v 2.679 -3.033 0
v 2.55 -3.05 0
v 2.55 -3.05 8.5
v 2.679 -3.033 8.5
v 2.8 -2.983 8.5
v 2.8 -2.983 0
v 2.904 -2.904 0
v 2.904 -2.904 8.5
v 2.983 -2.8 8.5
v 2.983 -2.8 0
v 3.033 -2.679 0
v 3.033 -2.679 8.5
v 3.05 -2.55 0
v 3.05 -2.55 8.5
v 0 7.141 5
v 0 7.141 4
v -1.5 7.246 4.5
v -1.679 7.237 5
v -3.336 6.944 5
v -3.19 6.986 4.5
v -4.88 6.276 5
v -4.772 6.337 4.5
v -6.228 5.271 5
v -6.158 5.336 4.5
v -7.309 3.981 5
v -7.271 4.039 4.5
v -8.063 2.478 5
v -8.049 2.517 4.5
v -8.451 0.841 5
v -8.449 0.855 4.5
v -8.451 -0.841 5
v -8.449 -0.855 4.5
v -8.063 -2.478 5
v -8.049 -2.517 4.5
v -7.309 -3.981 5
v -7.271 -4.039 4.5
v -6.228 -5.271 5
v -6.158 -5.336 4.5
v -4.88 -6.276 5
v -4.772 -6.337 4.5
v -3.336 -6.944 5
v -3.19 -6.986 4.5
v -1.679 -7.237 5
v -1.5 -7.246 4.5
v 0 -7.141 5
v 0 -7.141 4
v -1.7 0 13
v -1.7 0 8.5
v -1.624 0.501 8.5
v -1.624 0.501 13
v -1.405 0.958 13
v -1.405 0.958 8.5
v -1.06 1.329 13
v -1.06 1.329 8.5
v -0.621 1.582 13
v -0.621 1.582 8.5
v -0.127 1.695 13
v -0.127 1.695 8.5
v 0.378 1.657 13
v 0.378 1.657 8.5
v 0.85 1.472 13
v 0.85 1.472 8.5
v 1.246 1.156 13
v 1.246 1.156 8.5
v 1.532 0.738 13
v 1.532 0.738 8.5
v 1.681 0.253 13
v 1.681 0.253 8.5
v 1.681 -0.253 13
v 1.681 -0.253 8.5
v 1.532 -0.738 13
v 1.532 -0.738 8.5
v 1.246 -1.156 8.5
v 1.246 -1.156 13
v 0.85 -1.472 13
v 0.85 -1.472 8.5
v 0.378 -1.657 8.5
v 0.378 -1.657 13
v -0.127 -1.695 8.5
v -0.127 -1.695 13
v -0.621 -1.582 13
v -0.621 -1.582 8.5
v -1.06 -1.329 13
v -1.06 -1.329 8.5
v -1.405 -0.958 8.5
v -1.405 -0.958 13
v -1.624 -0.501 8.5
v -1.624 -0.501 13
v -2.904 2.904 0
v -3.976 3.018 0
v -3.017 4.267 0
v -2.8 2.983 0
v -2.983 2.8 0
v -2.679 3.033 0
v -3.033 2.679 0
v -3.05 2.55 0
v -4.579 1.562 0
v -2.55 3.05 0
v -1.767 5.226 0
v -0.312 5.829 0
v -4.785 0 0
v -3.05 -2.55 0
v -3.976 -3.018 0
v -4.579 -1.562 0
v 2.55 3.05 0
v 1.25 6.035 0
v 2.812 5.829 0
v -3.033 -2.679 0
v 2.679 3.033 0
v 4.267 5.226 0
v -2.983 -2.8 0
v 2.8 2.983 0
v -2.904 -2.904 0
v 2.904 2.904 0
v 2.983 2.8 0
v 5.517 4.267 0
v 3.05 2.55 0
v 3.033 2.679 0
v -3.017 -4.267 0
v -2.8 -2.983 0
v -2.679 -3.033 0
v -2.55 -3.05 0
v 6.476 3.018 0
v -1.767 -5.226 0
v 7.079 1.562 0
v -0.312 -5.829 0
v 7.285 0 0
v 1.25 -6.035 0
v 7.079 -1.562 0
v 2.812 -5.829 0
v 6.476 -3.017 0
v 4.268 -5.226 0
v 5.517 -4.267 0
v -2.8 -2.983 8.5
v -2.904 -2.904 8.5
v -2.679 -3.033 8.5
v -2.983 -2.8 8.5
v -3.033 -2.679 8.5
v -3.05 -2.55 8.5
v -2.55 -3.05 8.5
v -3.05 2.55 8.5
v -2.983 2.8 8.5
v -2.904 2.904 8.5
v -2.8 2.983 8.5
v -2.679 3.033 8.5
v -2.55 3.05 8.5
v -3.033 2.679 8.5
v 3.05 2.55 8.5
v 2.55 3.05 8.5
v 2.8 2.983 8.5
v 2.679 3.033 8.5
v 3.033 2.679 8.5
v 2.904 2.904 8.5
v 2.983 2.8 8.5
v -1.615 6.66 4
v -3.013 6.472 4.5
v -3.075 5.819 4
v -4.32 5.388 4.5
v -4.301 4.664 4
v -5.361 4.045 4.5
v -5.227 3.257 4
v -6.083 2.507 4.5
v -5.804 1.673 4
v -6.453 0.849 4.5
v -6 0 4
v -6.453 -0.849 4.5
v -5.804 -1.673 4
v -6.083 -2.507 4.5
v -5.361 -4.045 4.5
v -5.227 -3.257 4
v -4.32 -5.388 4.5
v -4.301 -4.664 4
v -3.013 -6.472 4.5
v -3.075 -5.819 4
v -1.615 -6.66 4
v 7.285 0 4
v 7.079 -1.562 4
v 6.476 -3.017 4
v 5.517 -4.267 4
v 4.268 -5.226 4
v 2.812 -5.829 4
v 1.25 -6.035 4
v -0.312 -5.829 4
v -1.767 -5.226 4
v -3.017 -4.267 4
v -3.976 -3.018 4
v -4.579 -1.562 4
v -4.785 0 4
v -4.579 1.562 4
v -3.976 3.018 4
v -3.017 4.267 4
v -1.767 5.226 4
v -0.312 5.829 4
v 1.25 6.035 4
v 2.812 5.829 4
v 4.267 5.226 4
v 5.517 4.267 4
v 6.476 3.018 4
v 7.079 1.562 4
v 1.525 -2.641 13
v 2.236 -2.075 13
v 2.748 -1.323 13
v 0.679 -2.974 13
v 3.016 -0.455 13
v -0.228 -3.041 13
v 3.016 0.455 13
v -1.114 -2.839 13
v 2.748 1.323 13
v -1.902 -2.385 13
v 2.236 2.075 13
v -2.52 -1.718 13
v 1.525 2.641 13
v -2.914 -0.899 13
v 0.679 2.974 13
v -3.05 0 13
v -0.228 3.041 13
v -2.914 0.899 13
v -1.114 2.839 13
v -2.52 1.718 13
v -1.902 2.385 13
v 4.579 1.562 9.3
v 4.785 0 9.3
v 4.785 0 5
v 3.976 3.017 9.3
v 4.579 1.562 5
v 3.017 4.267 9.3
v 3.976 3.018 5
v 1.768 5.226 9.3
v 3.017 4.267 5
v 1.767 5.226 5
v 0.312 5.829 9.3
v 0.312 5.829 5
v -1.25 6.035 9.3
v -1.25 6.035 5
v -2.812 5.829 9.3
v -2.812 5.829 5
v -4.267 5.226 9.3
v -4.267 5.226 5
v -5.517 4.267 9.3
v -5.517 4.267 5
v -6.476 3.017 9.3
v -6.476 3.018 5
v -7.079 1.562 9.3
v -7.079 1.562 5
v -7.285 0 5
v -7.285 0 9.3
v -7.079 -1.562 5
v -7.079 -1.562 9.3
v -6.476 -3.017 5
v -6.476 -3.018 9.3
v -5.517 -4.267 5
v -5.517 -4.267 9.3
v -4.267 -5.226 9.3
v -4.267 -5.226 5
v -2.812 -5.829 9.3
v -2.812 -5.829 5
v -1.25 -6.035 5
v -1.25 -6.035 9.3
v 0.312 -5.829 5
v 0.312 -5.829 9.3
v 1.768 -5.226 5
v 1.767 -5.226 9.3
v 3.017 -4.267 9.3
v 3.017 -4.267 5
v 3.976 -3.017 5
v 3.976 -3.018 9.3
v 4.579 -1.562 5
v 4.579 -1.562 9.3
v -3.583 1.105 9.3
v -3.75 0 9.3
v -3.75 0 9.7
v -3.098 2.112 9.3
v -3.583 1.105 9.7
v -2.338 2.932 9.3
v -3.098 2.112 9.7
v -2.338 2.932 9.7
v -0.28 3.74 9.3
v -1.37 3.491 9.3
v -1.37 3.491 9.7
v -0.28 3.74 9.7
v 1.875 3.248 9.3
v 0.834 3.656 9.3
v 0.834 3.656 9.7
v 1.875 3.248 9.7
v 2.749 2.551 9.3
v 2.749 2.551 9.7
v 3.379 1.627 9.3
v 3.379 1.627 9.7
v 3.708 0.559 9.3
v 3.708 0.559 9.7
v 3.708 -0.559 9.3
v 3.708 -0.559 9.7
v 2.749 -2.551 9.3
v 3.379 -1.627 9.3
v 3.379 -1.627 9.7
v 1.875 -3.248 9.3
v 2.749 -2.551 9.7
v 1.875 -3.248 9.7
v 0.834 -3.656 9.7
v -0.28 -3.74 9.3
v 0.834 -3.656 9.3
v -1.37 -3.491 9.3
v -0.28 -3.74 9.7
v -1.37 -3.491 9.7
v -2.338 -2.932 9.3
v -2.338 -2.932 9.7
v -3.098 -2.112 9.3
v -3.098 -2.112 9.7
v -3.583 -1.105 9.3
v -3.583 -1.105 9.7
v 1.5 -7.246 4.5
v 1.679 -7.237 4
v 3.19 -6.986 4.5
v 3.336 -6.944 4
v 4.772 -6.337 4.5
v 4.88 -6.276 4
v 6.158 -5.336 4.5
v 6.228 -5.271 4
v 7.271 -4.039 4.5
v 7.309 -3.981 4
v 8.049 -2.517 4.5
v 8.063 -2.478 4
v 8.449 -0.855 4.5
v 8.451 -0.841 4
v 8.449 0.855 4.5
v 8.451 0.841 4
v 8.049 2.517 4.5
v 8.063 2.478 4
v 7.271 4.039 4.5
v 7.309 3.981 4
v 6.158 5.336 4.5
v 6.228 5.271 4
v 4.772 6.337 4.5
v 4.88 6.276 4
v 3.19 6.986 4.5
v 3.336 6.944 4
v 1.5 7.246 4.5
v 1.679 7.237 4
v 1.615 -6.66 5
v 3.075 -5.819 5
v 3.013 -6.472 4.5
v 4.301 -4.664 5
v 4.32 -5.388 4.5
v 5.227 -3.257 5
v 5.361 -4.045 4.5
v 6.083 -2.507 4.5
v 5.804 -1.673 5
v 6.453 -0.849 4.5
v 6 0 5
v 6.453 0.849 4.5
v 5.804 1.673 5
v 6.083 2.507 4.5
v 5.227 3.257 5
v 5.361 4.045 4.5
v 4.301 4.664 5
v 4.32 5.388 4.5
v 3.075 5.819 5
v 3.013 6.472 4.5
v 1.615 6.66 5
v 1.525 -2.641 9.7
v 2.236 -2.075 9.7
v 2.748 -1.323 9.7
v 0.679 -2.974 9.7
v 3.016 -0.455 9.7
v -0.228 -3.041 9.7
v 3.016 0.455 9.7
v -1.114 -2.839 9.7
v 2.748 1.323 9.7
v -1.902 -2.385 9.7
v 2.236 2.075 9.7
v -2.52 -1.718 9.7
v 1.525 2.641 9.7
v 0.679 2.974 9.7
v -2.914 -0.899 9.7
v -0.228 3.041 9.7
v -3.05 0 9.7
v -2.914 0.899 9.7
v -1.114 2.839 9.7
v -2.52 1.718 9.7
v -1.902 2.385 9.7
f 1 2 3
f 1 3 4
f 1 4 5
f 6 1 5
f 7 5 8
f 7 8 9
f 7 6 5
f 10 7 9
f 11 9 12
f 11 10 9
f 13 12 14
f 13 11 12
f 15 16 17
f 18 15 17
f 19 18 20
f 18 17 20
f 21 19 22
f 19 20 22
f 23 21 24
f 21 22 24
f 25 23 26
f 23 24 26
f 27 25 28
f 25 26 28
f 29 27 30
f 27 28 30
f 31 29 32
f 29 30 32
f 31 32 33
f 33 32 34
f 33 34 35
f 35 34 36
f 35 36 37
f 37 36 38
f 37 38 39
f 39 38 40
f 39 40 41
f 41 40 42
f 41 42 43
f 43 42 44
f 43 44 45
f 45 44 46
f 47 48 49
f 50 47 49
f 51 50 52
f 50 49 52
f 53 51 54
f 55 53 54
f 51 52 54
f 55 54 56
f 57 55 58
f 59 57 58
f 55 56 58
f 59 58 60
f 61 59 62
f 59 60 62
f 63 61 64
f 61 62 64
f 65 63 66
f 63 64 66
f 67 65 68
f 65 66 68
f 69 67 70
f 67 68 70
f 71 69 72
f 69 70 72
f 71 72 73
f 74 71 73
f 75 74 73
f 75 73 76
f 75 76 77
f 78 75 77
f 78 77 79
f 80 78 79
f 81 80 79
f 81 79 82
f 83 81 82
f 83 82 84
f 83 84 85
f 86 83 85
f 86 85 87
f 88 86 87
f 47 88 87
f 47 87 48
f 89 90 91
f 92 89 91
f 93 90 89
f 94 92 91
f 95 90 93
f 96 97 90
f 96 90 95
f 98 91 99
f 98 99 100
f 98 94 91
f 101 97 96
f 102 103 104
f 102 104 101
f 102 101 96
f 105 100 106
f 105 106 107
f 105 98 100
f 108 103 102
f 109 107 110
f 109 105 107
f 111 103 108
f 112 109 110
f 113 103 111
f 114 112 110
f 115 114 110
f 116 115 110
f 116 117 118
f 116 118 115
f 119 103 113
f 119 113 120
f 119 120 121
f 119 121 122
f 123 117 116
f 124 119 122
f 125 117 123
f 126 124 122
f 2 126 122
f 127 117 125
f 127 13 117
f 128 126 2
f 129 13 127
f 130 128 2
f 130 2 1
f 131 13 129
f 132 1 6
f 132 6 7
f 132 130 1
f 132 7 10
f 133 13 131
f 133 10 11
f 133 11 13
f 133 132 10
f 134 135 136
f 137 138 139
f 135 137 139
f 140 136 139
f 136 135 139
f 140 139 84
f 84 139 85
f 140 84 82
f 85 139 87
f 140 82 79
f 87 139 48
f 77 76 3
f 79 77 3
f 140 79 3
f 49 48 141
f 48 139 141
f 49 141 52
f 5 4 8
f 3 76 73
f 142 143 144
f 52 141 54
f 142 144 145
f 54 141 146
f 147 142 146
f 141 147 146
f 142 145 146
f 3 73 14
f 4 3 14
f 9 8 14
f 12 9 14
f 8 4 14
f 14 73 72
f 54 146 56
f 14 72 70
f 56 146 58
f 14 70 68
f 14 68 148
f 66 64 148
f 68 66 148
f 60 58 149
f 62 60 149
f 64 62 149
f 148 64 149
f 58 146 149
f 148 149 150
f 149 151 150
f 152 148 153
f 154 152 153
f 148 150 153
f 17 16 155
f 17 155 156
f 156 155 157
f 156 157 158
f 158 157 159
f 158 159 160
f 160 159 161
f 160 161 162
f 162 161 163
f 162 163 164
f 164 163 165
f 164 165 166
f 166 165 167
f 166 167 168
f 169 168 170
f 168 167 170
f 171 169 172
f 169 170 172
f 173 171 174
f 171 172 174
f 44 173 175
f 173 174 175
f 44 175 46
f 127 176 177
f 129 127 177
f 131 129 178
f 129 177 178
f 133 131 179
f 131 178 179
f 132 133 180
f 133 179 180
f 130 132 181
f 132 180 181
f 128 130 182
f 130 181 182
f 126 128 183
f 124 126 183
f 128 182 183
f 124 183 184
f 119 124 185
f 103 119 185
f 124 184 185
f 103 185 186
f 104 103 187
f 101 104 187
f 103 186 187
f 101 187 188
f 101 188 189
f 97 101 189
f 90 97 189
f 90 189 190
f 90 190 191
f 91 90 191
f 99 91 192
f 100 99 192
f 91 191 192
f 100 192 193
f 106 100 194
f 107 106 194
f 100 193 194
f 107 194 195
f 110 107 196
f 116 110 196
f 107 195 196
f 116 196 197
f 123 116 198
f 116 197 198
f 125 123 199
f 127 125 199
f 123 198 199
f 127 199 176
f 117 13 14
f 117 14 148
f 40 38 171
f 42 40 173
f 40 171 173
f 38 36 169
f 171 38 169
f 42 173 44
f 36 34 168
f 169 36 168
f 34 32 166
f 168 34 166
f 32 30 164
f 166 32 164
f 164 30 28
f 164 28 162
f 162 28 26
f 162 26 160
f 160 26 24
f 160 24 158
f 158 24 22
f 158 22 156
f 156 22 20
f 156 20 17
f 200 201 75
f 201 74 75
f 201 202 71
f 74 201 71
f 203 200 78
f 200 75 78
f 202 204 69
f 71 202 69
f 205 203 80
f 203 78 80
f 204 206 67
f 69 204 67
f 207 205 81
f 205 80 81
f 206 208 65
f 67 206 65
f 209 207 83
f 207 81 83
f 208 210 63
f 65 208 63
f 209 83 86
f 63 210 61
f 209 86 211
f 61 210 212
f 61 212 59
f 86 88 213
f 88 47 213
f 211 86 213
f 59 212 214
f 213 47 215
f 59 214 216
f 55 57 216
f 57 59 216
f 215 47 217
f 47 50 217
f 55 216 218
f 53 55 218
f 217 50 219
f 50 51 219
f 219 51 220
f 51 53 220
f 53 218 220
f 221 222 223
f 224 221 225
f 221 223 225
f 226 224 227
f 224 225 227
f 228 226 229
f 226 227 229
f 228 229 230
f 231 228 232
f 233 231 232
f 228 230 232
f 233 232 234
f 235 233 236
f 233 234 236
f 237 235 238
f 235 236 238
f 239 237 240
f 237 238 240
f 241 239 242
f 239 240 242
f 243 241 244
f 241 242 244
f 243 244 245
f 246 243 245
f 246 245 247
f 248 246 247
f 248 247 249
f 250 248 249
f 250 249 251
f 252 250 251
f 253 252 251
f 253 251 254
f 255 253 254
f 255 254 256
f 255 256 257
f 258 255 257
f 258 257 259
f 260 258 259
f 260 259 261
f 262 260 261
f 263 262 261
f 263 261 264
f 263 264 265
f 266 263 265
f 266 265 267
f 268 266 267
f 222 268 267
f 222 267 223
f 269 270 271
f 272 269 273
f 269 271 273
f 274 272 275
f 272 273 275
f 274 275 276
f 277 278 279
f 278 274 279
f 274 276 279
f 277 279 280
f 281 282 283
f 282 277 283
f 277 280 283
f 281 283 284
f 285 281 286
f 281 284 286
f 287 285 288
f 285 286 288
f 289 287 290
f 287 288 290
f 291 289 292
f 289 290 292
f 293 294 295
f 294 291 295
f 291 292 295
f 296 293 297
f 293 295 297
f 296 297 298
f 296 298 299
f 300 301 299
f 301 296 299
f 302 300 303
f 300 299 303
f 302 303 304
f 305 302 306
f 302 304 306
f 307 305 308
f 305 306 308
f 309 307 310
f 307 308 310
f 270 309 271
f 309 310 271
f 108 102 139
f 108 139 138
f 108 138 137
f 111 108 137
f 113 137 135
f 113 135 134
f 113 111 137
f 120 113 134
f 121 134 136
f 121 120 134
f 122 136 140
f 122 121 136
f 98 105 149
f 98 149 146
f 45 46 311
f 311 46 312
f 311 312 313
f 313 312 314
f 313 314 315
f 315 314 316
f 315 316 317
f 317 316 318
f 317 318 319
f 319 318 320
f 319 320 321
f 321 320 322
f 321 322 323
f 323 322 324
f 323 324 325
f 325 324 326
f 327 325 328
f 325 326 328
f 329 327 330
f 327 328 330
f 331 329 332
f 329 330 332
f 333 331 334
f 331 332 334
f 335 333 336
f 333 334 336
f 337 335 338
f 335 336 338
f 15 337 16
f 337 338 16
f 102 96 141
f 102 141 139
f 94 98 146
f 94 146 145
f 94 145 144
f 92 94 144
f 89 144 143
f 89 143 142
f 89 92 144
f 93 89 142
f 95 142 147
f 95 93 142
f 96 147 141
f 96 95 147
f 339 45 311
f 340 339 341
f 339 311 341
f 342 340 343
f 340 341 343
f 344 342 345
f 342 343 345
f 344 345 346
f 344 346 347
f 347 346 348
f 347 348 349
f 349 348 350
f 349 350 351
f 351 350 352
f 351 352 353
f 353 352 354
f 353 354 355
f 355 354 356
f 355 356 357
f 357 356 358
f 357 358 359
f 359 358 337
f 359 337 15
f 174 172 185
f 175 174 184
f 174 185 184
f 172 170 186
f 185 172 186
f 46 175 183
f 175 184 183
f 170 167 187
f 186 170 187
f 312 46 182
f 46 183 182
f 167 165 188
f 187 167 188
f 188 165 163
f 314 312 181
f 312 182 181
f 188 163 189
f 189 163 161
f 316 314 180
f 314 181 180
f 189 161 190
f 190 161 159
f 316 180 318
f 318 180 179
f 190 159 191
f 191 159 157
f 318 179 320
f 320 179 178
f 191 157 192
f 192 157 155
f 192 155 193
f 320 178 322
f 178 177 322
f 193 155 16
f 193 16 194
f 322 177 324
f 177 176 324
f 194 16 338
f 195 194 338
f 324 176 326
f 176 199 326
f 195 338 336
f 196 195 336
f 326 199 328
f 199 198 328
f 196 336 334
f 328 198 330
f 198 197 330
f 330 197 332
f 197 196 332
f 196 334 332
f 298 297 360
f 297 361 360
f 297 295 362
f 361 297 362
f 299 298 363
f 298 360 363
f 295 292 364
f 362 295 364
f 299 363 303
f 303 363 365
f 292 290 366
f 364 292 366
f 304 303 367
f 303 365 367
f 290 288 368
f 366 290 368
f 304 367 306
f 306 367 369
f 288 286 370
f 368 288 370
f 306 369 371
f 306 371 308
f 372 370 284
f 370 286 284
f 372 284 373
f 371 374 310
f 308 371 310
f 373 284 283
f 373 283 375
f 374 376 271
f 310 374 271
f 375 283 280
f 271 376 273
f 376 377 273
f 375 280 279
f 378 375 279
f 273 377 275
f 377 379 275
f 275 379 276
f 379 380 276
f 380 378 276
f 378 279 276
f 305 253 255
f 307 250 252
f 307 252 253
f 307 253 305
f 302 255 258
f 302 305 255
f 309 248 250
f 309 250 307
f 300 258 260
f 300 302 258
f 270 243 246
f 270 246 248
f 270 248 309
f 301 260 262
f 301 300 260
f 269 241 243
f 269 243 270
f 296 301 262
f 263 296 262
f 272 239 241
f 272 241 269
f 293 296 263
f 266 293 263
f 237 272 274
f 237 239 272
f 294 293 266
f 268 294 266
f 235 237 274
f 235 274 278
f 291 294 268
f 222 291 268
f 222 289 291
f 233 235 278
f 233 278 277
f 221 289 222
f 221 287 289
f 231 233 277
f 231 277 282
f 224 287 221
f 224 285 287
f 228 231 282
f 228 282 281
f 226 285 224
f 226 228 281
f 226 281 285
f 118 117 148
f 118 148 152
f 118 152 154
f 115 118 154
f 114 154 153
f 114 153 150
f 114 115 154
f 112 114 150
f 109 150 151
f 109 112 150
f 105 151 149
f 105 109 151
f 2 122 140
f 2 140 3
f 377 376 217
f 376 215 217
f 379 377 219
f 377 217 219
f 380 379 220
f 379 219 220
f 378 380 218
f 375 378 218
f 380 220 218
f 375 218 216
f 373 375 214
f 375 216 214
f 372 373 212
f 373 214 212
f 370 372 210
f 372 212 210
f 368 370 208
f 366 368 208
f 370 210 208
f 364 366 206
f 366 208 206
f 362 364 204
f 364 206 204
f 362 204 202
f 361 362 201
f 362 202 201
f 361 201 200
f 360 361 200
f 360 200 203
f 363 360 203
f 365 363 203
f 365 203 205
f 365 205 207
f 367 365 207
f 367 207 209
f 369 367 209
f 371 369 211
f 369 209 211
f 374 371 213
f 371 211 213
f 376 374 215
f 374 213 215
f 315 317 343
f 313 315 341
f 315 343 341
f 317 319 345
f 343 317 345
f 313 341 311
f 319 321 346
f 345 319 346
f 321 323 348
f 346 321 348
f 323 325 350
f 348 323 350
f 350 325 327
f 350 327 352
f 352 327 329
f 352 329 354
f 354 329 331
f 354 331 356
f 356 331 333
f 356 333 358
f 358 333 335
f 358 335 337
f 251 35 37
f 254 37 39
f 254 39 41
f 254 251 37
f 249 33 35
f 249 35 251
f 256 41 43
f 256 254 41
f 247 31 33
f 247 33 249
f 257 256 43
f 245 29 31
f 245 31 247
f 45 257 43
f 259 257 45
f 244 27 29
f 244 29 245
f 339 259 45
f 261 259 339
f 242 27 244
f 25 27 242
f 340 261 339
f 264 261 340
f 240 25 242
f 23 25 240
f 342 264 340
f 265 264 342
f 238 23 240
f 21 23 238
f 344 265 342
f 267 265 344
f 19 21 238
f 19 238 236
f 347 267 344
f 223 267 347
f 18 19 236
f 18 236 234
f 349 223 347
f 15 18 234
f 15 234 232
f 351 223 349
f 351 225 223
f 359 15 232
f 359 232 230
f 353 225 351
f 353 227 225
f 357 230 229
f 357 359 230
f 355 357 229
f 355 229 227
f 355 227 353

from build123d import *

# Parameters (mm, degrees)
EXTRUDE_START           = -0.5
EXTRUDE_1_OUTLINE_R     = 6.035
EXTRUDE_1_DEPTH         = 4.8
EXTRUDE_START_2         = 4
EXTRUDE_1_2_DEPTH       = 1
SKETCH_2_R              = 6.035
EXTRUDE_2_DEPTH         = 4
HOLE_WIZARD_3_4_3_4_1_D = 3.4
CUT_EXTRUDE_1_DEPTH     = 8.5


with BuildPart() as part:
    # 凸台-拉伸1: read off the stored shape, not the designer's step
    # 凸台-拉伸1 outline → 凸台-拉伸1 (new body)
    with BuildSketch(Plane.XY.offset(5).offset(EXTRUDE_START)):
        with Locations((-1.25, 0)):
            Circle(EXTRUDE_1_OUTLINE_R)
    extrude(amount=EXTRUDE_1_DEPTH)

    # Extrude 1 2 outline → Extrude 1 2 (add)
    with BuildSketch(Plane.XY.offset(EXTRUDE_START_2)):
        with BuildLine():
            ThreePointArc((0, -7.141428429), (8.5, 0), (0, 7.141428429))
            ThreePointArc((0, 7.141428429), (-8.5, 0), (0, -7.141428429))
        make_face()
    extrude(amount=EXTRUDE_1_2_DEPTH)

    # Extrude 1 3 outline → Extrude 1 3 (revolve, cut)
    with BuildSketch(Plane(origin=(-1.25, 0, 0), x_dir=(1, 0, 0), z_dir=(0, -1, 0))):
        Polygon((7.25, 5), (7.75, 4.5), (9.75, 4.5), (9.75, 5), align=None)
    revolve(axis=Axis((-1.25, 0, 0), (0, 0, 1)), mode=Mode.SUBTRACT)

    # Extrude 1 4 outline → Extrude 1 4 (revolve, cut)
    with BuildSketch(Plane(origin=(1.25, 0, 0), x_dir=(1, 0, 0), z_dir=(0, -1, 0))):
        Polygon((9.75, 4.5), (7.75, 4.5), (7.25, 4), (9.75, 4), align=None)
    revolve(axis=Axis((1.25, 0, 0), (0, 0, 1)), mode=Mode.SUBTRACT)

    # 草图2 → 凸台-拉伸2 (add)
    with BuildSketch(Plane(origin=(0, 0, 4), x_dir=(-1, 0, 0), z_dir=(0, 0, -1))):
        with Locations(Location((-1.25, 0, 0), (0, 0, 180))):
            Circle(SKETCH_2_R)
    extrude(amount=EXTRUDE_2_DEPTH)

    # 草图5 → 旋转1 (revolve)
    with BuildSketch(Plane.XZ, mode=Mode.PRIVATE) as revolve_1_sk:
        Polygon((3.05, 13), (0, 13), (0, 9), (3.75, 9), (3.75, 9.7), (3.05, 9.7), align=None)
    revolve(revolve_1_sk.sketch.rotate(Axis((0, 0, 13), (0, 0, -1)), 180), axis=Axis((0, 0, 13), (0, 0, -1)))

    # Ø3.4 (3.4) 直径孔1 (through all)
    with Locations(Plane.XY.offset(13)):
        with Locations((0, 0)):
            Hole(HOLE_WIZARD_3_4_3_4_1_D / 2)

    # 草图8 → 切除-拉伸1 (cut)
    with BuildSketch(Plane(origin=(0, 0, 0), x_dir=(-1, 0, 0), z_dir=(0, 0, -1))):
        with BuildLine():
            Line((-2.55, 3.05), (2.55, 3.05))
            ThreePointArc((2.55, 3.05), (2.903553391, 2.903553391), (3.05, 2.55))
            Line((3.05, 2.55), (3.05, -2.55))
            ThreePointArc((3.05, -2.55), (2.903553391, -2.903553391), (2.55, -3.05))
            Line((2.55, -3.05), (-2.55, -3.05))
            ThreePointArc((-2.55, -3.05), (-2.903553391, -2.903553391), (-3.05, -2.55))
            Line((-3.05, -2.55), (-3.05, 2.55))
            ThreePointArc((-3.05, 2.55), (-2.903553391, 2.903553391), (-2.55, 3.05))
        make_face()
    extrude(amount=-CUT_EXTRUDE_1_DEPTH, mode=Mode.SUBTRACT)


solid = part.part
